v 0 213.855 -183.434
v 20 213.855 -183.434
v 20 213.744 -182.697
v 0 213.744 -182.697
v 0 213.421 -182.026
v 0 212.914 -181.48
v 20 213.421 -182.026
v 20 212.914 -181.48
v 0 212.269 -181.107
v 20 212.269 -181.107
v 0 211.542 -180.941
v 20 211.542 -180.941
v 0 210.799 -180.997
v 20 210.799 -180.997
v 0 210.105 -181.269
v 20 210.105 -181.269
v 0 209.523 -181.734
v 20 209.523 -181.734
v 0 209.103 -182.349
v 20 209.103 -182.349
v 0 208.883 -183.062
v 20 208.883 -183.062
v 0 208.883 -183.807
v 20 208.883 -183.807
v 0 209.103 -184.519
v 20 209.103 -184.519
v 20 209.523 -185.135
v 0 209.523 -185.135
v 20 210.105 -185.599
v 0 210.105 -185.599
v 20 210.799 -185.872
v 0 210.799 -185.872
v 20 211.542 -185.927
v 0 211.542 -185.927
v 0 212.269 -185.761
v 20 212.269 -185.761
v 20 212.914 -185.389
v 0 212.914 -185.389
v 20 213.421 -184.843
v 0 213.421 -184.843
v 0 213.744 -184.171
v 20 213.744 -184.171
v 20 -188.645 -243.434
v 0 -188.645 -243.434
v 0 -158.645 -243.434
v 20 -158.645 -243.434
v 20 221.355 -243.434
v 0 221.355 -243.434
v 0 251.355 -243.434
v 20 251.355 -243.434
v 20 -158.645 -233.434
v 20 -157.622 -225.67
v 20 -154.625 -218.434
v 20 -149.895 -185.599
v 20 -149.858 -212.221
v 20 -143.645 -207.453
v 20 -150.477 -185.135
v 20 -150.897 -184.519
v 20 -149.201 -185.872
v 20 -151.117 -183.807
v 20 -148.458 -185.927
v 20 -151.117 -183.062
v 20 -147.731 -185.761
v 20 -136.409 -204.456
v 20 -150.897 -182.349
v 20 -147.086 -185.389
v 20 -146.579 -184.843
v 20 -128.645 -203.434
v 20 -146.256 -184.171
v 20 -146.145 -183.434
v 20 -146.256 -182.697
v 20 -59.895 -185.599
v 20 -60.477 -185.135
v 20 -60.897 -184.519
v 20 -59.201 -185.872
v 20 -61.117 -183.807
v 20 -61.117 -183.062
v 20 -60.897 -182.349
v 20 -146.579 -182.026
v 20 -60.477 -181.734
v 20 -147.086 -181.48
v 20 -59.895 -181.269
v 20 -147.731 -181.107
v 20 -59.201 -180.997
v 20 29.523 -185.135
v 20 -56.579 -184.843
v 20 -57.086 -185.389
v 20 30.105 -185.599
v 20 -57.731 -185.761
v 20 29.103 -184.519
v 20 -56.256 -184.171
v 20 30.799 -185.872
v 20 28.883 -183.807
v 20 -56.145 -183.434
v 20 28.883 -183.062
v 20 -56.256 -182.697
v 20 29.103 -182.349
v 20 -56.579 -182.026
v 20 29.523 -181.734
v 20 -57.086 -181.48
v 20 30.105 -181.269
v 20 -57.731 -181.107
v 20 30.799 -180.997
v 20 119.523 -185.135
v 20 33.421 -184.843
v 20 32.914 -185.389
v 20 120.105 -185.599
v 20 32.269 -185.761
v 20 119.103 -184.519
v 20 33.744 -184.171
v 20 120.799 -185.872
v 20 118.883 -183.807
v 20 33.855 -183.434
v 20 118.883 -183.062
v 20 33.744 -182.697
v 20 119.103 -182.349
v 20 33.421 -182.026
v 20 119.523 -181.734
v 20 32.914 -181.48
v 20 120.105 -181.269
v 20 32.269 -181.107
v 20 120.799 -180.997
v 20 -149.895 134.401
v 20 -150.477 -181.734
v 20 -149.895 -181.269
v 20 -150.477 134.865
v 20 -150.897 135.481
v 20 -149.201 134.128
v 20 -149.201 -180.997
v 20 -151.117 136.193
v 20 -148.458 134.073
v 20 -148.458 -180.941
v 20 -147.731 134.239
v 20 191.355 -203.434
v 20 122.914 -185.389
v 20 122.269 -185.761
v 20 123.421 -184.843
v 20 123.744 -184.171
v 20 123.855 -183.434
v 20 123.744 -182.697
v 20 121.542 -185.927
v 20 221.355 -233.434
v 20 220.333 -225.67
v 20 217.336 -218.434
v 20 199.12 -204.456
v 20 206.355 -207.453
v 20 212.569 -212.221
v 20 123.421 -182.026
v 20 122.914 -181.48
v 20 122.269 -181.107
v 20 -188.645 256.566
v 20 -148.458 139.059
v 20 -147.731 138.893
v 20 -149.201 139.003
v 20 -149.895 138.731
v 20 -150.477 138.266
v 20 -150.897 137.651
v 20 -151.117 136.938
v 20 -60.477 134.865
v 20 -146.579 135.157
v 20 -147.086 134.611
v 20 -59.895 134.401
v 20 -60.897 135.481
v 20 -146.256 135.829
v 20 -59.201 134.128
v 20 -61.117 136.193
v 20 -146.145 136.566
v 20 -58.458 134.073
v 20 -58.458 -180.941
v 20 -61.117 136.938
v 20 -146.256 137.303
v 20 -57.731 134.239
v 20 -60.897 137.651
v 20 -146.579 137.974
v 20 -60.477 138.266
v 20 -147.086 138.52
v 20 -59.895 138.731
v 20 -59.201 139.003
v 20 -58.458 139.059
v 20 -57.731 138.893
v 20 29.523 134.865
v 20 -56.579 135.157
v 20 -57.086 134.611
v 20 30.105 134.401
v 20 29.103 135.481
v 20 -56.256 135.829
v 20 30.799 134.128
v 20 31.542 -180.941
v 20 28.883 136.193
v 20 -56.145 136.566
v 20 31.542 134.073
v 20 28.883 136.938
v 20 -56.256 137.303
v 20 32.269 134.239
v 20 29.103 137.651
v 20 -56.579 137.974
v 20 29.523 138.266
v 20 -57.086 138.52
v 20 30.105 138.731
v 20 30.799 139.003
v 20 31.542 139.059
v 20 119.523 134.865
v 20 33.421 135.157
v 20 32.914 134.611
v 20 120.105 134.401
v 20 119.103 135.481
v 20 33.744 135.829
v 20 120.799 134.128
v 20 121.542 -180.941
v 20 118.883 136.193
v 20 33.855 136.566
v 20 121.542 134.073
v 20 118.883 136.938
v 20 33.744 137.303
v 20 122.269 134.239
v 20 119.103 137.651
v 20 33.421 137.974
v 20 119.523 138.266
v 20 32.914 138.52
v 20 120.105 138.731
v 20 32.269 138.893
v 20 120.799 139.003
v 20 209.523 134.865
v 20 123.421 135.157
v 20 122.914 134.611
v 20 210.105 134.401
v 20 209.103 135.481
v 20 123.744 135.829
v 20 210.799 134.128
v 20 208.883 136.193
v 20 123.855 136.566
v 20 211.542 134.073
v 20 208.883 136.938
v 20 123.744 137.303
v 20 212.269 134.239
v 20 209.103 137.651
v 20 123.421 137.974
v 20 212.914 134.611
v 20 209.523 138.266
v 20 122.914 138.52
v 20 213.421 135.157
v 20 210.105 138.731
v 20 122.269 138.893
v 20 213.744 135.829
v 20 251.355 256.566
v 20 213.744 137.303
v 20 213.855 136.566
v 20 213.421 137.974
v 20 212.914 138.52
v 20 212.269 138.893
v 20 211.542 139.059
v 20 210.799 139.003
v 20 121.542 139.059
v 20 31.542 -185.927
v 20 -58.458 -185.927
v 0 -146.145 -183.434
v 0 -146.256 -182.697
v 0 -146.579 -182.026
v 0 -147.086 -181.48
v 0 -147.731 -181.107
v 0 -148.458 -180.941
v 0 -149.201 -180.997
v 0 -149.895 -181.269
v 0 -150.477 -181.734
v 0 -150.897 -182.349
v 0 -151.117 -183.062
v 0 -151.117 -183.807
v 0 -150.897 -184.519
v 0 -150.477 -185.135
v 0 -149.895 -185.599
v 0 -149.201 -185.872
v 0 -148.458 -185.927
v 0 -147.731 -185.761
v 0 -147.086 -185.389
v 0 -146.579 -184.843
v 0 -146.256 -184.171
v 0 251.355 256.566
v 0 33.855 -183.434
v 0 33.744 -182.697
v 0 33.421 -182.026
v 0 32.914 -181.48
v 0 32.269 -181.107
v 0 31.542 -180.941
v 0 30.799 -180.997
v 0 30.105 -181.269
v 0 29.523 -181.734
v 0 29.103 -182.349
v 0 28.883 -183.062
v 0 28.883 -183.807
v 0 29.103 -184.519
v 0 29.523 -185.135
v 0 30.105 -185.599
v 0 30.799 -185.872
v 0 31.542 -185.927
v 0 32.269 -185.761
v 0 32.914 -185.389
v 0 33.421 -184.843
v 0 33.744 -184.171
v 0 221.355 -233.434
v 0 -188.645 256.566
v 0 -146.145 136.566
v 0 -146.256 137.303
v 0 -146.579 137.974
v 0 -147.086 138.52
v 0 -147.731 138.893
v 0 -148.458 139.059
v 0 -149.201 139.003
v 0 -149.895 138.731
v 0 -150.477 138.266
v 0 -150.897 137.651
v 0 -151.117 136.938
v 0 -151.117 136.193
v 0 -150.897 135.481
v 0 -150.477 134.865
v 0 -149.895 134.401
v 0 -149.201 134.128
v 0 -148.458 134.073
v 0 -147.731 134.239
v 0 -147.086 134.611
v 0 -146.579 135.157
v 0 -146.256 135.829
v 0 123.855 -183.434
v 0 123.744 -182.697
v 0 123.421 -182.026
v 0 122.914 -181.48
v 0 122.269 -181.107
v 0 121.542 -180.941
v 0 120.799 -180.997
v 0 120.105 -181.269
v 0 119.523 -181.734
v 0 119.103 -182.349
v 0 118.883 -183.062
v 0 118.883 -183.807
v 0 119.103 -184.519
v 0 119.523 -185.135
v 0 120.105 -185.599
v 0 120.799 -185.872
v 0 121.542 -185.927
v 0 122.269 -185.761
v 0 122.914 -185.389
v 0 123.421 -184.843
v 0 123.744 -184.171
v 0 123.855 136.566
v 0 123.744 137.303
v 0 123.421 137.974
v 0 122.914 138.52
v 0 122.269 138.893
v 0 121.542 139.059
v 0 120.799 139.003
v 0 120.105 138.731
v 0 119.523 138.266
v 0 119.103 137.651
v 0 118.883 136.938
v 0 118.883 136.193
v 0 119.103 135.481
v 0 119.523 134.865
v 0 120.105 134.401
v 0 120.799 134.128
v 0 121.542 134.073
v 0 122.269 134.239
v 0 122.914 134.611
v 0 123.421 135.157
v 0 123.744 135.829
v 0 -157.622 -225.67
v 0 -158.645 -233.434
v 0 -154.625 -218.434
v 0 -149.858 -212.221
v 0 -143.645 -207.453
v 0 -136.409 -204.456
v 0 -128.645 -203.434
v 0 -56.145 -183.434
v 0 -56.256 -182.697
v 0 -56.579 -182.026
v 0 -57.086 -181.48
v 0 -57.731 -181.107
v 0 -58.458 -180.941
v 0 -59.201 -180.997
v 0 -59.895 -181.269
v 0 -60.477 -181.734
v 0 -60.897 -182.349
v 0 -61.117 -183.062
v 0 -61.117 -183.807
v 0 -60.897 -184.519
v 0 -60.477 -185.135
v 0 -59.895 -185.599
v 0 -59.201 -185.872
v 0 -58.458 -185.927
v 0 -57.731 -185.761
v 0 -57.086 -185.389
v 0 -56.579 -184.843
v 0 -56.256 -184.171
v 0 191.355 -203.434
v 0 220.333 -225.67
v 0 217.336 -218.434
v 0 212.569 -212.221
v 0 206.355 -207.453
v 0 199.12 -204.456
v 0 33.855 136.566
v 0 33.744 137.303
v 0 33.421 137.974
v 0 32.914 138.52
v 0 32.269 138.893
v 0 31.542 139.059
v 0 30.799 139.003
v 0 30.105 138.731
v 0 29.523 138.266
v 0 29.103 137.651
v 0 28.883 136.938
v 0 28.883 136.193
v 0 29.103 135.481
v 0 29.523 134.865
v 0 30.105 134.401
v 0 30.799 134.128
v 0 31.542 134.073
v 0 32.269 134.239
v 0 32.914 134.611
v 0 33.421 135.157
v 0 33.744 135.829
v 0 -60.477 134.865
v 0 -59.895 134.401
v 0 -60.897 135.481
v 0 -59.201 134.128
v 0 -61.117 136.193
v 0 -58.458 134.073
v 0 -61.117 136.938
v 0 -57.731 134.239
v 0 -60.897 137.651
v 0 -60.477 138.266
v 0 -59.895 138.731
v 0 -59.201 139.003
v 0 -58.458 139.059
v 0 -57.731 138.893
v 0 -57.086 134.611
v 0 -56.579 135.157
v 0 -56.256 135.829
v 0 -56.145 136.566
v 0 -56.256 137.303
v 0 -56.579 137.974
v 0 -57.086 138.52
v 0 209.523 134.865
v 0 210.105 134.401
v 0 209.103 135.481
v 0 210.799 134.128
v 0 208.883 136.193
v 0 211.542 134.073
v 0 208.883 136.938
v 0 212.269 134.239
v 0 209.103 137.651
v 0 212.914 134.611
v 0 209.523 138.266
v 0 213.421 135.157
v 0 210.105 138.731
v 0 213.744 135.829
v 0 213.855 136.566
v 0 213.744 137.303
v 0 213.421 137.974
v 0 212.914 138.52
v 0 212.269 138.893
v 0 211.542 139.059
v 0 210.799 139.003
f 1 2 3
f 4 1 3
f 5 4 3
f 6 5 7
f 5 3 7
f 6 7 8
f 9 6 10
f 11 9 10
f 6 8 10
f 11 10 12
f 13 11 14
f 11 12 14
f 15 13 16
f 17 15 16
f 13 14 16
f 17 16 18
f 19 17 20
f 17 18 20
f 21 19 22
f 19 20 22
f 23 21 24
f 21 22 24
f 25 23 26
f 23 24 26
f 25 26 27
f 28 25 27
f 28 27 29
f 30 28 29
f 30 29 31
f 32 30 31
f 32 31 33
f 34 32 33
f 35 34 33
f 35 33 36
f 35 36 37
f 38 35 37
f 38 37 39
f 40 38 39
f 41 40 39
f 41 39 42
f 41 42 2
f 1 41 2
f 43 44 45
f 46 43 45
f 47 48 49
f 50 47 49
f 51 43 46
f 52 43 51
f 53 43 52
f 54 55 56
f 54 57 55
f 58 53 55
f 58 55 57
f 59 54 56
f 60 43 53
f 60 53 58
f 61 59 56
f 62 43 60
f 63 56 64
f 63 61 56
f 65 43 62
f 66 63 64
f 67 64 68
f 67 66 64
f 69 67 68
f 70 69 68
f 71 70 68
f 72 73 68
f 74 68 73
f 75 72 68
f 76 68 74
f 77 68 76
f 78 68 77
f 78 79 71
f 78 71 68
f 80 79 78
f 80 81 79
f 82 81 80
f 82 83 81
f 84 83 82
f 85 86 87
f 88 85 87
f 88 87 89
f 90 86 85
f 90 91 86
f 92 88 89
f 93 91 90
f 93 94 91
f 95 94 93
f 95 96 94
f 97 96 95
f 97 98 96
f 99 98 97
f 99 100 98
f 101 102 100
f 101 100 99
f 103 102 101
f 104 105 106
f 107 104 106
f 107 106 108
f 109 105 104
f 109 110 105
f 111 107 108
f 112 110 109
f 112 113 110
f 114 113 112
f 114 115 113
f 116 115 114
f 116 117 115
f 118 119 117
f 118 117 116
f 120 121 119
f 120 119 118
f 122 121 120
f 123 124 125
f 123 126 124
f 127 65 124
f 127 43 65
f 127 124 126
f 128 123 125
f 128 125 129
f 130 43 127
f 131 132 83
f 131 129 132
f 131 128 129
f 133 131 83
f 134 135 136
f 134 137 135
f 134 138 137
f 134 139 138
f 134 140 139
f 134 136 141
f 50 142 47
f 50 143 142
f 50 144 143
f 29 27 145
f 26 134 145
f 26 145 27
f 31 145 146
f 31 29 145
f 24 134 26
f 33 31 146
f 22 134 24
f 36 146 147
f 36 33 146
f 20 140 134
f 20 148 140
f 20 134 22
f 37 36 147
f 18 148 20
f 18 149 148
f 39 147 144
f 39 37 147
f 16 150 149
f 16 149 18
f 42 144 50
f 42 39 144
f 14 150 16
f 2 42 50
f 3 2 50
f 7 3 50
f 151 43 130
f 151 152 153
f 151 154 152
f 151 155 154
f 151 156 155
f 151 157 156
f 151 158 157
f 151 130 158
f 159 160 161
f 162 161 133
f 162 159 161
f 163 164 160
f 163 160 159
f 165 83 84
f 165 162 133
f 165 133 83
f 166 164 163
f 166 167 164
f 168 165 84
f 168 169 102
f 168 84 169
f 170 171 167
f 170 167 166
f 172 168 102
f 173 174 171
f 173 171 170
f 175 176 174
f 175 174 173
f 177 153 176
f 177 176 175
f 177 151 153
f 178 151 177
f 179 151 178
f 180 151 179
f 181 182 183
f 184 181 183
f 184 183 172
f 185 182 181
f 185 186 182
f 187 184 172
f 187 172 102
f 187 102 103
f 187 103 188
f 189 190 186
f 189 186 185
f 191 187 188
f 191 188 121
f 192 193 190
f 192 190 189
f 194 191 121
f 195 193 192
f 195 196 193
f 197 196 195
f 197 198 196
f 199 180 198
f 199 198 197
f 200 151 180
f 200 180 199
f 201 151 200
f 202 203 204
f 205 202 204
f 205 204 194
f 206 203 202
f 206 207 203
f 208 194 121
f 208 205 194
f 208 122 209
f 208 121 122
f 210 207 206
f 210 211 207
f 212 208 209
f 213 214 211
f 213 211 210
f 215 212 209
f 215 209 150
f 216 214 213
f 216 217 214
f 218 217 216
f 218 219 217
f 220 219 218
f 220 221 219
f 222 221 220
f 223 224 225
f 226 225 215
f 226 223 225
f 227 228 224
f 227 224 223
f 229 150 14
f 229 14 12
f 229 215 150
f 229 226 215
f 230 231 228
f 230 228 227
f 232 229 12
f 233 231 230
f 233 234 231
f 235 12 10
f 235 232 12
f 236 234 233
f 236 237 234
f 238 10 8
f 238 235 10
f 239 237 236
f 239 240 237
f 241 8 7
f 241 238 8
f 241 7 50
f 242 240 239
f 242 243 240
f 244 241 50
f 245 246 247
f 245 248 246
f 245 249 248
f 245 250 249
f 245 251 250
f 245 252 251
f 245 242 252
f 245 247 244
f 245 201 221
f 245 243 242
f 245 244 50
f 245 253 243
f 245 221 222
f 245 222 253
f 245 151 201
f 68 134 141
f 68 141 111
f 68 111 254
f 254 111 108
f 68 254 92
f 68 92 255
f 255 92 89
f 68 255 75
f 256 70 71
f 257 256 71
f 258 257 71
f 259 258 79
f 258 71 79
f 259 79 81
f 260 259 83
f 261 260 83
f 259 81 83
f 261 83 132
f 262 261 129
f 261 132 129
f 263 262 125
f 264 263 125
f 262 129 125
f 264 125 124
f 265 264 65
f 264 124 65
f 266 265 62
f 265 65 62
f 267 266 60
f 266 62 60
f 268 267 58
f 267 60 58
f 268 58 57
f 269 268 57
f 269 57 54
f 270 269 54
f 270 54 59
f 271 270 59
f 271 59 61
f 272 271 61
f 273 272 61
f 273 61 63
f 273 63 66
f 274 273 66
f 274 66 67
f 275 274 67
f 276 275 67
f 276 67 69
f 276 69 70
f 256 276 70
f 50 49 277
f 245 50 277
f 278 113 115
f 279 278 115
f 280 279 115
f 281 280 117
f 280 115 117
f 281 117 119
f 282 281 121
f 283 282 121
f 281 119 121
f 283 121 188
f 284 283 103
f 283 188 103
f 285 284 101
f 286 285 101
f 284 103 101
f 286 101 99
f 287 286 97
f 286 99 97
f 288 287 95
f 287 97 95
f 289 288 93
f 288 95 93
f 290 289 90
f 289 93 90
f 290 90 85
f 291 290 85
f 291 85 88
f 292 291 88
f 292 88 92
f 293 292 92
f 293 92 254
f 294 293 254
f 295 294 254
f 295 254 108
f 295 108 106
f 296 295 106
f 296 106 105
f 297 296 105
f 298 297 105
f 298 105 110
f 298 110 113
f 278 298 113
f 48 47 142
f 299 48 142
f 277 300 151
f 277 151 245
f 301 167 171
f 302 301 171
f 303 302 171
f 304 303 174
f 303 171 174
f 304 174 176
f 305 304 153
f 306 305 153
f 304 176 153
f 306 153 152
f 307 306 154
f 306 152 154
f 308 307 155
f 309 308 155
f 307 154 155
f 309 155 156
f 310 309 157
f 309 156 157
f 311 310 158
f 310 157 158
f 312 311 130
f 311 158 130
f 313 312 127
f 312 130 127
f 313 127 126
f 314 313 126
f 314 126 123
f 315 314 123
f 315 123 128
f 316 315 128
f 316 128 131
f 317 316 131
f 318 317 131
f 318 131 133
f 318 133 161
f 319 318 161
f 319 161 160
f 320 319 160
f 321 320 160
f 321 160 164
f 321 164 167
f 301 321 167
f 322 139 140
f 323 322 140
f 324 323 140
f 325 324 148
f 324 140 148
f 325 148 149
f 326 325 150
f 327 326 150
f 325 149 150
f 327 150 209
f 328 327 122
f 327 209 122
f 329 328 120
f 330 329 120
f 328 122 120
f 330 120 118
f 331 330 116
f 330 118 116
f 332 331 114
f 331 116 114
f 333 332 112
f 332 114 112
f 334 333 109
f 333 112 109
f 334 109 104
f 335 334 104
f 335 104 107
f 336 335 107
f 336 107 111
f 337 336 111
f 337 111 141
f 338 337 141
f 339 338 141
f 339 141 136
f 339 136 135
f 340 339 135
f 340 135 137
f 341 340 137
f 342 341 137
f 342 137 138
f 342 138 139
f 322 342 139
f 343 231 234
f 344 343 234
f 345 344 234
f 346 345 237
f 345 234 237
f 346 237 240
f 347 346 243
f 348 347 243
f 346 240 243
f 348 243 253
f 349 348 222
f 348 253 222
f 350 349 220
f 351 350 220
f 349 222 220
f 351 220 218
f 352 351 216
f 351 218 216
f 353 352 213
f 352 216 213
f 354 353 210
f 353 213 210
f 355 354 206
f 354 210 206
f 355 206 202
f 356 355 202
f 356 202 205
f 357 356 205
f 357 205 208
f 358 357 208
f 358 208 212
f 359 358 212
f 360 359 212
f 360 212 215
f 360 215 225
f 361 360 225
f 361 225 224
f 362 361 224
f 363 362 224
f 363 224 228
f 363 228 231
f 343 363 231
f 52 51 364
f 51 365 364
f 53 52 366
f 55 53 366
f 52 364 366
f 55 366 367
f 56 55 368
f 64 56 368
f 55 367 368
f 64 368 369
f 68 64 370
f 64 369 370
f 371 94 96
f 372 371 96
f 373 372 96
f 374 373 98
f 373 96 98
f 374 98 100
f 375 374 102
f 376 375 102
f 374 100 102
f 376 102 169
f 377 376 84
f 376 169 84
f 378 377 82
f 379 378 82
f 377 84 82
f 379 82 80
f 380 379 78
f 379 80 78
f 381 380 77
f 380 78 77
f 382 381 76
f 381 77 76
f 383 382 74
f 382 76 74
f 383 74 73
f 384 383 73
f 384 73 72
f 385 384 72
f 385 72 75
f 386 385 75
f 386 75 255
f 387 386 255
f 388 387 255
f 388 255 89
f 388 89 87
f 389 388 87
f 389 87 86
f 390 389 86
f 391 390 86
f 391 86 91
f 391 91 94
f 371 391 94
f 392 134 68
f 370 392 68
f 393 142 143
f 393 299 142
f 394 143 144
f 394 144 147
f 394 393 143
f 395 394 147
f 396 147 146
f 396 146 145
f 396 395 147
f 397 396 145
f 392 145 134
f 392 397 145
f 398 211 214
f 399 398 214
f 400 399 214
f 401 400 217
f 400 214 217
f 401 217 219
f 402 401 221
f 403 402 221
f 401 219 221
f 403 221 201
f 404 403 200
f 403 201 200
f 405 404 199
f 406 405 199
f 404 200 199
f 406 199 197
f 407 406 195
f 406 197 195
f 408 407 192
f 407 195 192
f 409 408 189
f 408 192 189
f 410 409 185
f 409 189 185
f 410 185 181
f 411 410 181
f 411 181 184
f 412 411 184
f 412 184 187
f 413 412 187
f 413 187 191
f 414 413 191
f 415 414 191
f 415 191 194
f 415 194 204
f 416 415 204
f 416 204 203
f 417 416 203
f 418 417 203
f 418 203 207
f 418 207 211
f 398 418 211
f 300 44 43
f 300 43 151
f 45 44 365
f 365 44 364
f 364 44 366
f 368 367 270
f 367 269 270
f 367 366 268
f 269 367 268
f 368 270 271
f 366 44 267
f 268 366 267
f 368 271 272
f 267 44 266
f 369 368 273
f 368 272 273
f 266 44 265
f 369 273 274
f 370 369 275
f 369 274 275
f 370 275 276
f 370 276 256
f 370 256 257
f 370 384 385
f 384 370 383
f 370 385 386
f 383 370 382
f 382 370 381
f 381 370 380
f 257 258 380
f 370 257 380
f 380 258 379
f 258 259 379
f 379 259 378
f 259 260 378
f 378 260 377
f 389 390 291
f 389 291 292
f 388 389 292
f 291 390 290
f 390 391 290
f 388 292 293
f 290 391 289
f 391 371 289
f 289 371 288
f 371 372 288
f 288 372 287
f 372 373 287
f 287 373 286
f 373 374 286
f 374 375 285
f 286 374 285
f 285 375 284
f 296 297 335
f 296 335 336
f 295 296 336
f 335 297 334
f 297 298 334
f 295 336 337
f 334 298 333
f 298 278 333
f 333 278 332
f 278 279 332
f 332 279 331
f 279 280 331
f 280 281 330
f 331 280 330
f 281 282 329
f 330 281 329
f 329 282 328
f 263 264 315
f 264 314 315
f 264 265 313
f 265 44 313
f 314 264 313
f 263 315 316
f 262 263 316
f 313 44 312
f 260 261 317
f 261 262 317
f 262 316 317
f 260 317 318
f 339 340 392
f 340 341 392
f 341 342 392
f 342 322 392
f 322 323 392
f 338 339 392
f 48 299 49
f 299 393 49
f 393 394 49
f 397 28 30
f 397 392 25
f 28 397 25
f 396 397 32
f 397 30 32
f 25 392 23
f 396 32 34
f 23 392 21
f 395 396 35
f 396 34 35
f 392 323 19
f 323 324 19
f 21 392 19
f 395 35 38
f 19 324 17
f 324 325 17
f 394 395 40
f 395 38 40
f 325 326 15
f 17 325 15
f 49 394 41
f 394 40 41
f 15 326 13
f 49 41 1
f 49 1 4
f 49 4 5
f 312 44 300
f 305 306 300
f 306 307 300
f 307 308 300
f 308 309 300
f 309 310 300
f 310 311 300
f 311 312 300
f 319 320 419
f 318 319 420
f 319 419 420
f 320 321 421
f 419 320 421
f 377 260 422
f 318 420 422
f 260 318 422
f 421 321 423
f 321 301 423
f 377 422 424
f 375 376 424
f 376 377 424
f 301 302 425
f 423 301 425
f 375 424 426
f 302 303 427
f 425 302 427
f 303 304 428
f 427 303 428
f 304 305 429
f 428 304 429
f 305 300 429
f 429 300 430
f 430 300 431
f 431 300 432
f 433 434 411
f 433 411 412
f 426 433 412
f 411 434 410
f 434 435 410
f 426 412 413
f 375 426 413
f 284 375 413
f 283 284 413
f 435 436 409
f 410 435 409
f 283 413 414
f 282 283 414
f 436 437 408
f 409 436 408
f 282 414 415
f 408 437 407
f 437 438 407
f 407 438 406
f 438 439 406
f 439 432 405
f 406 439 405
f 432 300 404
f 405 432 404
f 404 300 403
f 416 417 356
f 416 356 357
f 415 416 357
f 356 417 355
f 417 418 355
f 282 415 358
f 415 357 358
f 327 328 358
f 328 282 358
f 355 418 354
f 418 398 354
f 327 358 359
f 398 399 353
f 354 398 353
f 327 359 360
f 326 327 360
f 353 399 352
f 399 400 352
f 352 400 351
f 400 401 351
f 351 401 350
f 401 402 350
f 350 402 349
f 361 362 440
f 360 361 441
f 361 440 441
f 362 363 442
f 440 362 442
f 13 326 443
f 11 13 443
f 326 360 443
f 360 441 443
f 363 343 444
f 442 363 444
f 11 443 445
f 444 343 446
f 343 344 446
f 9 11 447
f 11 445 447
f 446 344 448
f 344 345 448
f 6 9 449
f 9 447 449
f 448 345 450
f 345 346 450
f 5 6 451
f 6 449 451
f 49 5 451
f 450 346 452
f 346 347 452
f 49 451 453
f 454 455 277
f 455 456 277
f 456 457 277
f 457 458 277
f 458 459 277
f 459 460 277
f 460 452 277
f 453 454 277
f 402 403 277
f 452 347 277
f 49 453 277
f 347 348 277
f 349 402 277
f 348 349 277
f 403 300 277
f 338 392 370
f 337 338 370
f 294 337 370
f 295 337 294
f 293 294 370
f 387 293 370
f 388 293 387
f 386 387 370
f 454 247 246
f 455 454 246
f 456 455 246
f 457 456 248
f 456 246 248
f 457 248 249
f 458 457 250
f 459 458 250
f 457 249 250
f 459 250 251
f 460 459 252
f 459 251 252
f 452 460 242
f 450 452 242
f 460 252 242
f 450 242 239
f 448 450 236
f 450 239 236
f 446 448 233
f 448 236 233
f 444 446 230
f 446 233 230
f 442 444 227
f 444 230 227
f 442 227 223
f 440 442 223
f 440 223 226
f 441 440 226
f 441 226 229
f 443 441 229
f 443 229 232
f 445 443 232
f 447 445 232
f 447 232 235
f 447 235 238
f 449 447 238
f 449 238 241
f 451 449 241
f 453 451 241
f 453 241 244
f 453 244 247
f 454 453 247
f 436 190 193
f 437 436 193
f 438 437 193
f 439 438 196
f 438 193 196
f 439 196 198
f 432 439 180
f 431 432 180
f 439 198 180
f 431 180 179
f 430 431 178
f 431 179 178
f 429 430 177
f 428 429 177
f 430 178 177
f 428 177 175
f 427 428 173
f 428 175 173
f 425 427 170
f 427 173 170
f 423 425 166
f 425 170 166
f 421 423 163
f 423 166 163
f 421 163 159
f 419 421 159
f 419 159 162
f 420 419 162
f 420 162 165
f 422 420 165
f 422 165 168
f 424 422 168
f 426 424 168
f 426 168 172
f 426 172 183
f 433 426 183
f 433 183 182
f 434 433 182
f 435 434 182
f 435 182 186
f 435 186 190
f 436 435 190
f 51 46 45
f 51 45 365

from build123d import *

# Parameters (mm, degrees)
F0_W     = 440
F0_H     = 500
F1_DEPTH = 20
F2_W     = 190
F2_H     = 40
F3_DEPTH = 20
F4_R     = 30
F6_D     = 5


# Not quite as in the source:
# - a feature names something its author has since deleted; it is built from what else it names


with BuildPart() as f1:
    # F0 (on Right) → F1 (new body)
    with BuildSketch(Plane.YZ):
        with Locations((31.3553263247, 6.565798074)):
            Rectangle(F0_W, F0_H)
    extrude(amount=F1_DEPTH)

    # F2 (on face) → F3 (cut, through all)
    with BuildSketch(Plane.YZ.offset(20)):
        with Locations((-63.6446736753, -223.434201926)):
            Rectangle(F2_W, F2_H)
        with Locations((126.3553263247, -223.434201926)):
            Rectangle(F2_W, F2_H)
    extrude(amount=-F3_DEPTH, mode=Mode.SUBTRACT)

    # F4
    f4_edges = [f1.edges().sort_by_distance(p)[0] for p in [
        (10, -158.644674, -203.434202),
        (10, 221.355326, -203.434202),
    ]]
    fillet(f4_edges, radius=F4_R)

    # F6 (through all)
    with Locations(Plane(origin=(0, 0, 0), x_dir=(0, -1, 0), z_dir=(-1, 0, 0))):
        with Locations((148.6446736753, -183.434201926), (58.6446736753, -183.434201926), (-31.3553263247, -183.434201926), (-121.3553263247, -183.434201926), (-211.3553263247, -183.434201926), (148.6446736753, 136.565798074), (58.6446736753, 136.565798074), (-31.3553263247, 136.565798074), (-121.3553263247, 136.565798074), (-211.3553263247, 136.565798074)):
            Hole(F6_D / 2)


solid = f1.part
